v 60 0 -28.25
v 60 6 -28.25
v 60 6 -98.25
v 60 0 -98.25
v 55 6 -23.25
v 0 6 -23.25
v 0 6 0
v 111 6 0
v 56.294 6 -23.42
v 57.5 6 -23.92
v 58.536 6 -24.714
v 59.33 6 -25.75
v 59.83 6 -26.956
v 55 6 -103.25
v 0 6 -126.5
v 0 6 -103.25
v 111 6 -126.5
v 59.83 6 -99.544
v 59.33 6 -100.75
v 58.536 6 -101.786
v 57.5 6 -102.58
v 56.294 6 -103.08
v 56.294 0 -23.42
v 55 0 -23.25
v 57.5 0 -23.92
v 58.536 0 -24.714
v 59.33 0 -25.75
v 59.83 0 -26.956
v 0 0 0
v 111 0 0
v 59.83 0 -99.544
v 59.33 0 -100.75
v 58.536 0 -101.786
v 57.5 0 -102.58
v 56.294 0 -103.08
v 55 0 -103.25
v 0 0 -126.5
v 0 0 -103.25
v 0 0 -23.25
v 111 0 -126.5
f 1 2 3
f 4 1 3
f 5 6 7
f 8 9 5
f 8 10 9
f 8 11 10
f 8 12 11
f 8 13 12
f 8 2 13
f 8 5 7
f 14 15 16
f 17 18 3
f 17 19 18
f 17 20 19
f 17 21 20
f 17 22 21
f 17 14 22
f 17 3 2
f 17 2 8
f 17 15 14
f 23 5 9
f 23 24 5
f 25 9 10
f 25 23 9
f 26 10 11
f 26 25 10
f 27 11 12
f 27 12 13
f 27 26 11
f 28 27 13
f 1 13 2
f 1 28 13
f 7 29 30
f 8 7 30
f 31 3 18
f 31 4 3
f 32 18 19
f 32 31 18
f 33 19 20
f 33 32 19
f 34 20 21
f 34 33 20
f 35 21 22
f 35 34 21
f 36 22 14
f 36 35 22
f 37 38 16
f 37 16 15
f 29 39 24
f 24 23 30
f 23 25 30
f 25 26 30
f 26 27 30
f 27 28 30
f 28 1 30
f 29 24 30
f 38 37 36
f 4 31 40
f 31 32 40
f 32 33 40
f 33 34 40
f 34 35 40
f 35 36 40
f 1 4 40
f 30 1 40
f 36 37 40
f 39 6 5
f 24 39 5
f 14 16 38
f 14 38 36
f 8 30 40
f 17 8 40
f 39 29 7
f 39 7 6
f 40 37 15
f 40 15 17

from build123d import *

# Parameters (mm, degrees)
SKETCH1_W           = 111
SKETCH1_H           = 126.5
BOSS_EXTRUDE1_DEPTH = 6
SKETCH2_W           = 60
SKETCH2_H           = 80
CUT_EXTRUDE1_DEPTH  = 7
FILLET1_R           = 5


with BuildPart() as part:
    # Sketch1 → Boss-Extrude1 (new body)
    with BuildSketch(Plane(origin=(0, 0, 0), x_dir=(1, 0, 0), z_dir=(0, 1, 0))):
        with Locations((55.5, 63.25)):
            Rectangle(SKETCH1_W, SKETCH1_H)
    extrude(amount=BOSS_EXTRUDE1_DEPTH)

    # Sketch2 → Cut-Extrude1 (cut, through all)
    with BuildSketch(Plane(origin=(0, 6, 0), x_dir=(1, 0, 0), z_dir=(0, 1, 0))):
        with Locations((30, 63.25)):
            Rectangle(SKETCH2_W, SKETCH2_H)
    extrude(amount=-CUT_EXTRUDE1_DEPTH, mode=Mode.SUBTRACT)

    # Fillet1
    fillet1_edges = [part.edges().sort_by_distance(p)[0] for p in [
        (60, 3, -103.25),
        (60, 3, -23.25),
    ]]
    fillet(fillet1_edges, radius=FILLET1_R)


solid = part.part
